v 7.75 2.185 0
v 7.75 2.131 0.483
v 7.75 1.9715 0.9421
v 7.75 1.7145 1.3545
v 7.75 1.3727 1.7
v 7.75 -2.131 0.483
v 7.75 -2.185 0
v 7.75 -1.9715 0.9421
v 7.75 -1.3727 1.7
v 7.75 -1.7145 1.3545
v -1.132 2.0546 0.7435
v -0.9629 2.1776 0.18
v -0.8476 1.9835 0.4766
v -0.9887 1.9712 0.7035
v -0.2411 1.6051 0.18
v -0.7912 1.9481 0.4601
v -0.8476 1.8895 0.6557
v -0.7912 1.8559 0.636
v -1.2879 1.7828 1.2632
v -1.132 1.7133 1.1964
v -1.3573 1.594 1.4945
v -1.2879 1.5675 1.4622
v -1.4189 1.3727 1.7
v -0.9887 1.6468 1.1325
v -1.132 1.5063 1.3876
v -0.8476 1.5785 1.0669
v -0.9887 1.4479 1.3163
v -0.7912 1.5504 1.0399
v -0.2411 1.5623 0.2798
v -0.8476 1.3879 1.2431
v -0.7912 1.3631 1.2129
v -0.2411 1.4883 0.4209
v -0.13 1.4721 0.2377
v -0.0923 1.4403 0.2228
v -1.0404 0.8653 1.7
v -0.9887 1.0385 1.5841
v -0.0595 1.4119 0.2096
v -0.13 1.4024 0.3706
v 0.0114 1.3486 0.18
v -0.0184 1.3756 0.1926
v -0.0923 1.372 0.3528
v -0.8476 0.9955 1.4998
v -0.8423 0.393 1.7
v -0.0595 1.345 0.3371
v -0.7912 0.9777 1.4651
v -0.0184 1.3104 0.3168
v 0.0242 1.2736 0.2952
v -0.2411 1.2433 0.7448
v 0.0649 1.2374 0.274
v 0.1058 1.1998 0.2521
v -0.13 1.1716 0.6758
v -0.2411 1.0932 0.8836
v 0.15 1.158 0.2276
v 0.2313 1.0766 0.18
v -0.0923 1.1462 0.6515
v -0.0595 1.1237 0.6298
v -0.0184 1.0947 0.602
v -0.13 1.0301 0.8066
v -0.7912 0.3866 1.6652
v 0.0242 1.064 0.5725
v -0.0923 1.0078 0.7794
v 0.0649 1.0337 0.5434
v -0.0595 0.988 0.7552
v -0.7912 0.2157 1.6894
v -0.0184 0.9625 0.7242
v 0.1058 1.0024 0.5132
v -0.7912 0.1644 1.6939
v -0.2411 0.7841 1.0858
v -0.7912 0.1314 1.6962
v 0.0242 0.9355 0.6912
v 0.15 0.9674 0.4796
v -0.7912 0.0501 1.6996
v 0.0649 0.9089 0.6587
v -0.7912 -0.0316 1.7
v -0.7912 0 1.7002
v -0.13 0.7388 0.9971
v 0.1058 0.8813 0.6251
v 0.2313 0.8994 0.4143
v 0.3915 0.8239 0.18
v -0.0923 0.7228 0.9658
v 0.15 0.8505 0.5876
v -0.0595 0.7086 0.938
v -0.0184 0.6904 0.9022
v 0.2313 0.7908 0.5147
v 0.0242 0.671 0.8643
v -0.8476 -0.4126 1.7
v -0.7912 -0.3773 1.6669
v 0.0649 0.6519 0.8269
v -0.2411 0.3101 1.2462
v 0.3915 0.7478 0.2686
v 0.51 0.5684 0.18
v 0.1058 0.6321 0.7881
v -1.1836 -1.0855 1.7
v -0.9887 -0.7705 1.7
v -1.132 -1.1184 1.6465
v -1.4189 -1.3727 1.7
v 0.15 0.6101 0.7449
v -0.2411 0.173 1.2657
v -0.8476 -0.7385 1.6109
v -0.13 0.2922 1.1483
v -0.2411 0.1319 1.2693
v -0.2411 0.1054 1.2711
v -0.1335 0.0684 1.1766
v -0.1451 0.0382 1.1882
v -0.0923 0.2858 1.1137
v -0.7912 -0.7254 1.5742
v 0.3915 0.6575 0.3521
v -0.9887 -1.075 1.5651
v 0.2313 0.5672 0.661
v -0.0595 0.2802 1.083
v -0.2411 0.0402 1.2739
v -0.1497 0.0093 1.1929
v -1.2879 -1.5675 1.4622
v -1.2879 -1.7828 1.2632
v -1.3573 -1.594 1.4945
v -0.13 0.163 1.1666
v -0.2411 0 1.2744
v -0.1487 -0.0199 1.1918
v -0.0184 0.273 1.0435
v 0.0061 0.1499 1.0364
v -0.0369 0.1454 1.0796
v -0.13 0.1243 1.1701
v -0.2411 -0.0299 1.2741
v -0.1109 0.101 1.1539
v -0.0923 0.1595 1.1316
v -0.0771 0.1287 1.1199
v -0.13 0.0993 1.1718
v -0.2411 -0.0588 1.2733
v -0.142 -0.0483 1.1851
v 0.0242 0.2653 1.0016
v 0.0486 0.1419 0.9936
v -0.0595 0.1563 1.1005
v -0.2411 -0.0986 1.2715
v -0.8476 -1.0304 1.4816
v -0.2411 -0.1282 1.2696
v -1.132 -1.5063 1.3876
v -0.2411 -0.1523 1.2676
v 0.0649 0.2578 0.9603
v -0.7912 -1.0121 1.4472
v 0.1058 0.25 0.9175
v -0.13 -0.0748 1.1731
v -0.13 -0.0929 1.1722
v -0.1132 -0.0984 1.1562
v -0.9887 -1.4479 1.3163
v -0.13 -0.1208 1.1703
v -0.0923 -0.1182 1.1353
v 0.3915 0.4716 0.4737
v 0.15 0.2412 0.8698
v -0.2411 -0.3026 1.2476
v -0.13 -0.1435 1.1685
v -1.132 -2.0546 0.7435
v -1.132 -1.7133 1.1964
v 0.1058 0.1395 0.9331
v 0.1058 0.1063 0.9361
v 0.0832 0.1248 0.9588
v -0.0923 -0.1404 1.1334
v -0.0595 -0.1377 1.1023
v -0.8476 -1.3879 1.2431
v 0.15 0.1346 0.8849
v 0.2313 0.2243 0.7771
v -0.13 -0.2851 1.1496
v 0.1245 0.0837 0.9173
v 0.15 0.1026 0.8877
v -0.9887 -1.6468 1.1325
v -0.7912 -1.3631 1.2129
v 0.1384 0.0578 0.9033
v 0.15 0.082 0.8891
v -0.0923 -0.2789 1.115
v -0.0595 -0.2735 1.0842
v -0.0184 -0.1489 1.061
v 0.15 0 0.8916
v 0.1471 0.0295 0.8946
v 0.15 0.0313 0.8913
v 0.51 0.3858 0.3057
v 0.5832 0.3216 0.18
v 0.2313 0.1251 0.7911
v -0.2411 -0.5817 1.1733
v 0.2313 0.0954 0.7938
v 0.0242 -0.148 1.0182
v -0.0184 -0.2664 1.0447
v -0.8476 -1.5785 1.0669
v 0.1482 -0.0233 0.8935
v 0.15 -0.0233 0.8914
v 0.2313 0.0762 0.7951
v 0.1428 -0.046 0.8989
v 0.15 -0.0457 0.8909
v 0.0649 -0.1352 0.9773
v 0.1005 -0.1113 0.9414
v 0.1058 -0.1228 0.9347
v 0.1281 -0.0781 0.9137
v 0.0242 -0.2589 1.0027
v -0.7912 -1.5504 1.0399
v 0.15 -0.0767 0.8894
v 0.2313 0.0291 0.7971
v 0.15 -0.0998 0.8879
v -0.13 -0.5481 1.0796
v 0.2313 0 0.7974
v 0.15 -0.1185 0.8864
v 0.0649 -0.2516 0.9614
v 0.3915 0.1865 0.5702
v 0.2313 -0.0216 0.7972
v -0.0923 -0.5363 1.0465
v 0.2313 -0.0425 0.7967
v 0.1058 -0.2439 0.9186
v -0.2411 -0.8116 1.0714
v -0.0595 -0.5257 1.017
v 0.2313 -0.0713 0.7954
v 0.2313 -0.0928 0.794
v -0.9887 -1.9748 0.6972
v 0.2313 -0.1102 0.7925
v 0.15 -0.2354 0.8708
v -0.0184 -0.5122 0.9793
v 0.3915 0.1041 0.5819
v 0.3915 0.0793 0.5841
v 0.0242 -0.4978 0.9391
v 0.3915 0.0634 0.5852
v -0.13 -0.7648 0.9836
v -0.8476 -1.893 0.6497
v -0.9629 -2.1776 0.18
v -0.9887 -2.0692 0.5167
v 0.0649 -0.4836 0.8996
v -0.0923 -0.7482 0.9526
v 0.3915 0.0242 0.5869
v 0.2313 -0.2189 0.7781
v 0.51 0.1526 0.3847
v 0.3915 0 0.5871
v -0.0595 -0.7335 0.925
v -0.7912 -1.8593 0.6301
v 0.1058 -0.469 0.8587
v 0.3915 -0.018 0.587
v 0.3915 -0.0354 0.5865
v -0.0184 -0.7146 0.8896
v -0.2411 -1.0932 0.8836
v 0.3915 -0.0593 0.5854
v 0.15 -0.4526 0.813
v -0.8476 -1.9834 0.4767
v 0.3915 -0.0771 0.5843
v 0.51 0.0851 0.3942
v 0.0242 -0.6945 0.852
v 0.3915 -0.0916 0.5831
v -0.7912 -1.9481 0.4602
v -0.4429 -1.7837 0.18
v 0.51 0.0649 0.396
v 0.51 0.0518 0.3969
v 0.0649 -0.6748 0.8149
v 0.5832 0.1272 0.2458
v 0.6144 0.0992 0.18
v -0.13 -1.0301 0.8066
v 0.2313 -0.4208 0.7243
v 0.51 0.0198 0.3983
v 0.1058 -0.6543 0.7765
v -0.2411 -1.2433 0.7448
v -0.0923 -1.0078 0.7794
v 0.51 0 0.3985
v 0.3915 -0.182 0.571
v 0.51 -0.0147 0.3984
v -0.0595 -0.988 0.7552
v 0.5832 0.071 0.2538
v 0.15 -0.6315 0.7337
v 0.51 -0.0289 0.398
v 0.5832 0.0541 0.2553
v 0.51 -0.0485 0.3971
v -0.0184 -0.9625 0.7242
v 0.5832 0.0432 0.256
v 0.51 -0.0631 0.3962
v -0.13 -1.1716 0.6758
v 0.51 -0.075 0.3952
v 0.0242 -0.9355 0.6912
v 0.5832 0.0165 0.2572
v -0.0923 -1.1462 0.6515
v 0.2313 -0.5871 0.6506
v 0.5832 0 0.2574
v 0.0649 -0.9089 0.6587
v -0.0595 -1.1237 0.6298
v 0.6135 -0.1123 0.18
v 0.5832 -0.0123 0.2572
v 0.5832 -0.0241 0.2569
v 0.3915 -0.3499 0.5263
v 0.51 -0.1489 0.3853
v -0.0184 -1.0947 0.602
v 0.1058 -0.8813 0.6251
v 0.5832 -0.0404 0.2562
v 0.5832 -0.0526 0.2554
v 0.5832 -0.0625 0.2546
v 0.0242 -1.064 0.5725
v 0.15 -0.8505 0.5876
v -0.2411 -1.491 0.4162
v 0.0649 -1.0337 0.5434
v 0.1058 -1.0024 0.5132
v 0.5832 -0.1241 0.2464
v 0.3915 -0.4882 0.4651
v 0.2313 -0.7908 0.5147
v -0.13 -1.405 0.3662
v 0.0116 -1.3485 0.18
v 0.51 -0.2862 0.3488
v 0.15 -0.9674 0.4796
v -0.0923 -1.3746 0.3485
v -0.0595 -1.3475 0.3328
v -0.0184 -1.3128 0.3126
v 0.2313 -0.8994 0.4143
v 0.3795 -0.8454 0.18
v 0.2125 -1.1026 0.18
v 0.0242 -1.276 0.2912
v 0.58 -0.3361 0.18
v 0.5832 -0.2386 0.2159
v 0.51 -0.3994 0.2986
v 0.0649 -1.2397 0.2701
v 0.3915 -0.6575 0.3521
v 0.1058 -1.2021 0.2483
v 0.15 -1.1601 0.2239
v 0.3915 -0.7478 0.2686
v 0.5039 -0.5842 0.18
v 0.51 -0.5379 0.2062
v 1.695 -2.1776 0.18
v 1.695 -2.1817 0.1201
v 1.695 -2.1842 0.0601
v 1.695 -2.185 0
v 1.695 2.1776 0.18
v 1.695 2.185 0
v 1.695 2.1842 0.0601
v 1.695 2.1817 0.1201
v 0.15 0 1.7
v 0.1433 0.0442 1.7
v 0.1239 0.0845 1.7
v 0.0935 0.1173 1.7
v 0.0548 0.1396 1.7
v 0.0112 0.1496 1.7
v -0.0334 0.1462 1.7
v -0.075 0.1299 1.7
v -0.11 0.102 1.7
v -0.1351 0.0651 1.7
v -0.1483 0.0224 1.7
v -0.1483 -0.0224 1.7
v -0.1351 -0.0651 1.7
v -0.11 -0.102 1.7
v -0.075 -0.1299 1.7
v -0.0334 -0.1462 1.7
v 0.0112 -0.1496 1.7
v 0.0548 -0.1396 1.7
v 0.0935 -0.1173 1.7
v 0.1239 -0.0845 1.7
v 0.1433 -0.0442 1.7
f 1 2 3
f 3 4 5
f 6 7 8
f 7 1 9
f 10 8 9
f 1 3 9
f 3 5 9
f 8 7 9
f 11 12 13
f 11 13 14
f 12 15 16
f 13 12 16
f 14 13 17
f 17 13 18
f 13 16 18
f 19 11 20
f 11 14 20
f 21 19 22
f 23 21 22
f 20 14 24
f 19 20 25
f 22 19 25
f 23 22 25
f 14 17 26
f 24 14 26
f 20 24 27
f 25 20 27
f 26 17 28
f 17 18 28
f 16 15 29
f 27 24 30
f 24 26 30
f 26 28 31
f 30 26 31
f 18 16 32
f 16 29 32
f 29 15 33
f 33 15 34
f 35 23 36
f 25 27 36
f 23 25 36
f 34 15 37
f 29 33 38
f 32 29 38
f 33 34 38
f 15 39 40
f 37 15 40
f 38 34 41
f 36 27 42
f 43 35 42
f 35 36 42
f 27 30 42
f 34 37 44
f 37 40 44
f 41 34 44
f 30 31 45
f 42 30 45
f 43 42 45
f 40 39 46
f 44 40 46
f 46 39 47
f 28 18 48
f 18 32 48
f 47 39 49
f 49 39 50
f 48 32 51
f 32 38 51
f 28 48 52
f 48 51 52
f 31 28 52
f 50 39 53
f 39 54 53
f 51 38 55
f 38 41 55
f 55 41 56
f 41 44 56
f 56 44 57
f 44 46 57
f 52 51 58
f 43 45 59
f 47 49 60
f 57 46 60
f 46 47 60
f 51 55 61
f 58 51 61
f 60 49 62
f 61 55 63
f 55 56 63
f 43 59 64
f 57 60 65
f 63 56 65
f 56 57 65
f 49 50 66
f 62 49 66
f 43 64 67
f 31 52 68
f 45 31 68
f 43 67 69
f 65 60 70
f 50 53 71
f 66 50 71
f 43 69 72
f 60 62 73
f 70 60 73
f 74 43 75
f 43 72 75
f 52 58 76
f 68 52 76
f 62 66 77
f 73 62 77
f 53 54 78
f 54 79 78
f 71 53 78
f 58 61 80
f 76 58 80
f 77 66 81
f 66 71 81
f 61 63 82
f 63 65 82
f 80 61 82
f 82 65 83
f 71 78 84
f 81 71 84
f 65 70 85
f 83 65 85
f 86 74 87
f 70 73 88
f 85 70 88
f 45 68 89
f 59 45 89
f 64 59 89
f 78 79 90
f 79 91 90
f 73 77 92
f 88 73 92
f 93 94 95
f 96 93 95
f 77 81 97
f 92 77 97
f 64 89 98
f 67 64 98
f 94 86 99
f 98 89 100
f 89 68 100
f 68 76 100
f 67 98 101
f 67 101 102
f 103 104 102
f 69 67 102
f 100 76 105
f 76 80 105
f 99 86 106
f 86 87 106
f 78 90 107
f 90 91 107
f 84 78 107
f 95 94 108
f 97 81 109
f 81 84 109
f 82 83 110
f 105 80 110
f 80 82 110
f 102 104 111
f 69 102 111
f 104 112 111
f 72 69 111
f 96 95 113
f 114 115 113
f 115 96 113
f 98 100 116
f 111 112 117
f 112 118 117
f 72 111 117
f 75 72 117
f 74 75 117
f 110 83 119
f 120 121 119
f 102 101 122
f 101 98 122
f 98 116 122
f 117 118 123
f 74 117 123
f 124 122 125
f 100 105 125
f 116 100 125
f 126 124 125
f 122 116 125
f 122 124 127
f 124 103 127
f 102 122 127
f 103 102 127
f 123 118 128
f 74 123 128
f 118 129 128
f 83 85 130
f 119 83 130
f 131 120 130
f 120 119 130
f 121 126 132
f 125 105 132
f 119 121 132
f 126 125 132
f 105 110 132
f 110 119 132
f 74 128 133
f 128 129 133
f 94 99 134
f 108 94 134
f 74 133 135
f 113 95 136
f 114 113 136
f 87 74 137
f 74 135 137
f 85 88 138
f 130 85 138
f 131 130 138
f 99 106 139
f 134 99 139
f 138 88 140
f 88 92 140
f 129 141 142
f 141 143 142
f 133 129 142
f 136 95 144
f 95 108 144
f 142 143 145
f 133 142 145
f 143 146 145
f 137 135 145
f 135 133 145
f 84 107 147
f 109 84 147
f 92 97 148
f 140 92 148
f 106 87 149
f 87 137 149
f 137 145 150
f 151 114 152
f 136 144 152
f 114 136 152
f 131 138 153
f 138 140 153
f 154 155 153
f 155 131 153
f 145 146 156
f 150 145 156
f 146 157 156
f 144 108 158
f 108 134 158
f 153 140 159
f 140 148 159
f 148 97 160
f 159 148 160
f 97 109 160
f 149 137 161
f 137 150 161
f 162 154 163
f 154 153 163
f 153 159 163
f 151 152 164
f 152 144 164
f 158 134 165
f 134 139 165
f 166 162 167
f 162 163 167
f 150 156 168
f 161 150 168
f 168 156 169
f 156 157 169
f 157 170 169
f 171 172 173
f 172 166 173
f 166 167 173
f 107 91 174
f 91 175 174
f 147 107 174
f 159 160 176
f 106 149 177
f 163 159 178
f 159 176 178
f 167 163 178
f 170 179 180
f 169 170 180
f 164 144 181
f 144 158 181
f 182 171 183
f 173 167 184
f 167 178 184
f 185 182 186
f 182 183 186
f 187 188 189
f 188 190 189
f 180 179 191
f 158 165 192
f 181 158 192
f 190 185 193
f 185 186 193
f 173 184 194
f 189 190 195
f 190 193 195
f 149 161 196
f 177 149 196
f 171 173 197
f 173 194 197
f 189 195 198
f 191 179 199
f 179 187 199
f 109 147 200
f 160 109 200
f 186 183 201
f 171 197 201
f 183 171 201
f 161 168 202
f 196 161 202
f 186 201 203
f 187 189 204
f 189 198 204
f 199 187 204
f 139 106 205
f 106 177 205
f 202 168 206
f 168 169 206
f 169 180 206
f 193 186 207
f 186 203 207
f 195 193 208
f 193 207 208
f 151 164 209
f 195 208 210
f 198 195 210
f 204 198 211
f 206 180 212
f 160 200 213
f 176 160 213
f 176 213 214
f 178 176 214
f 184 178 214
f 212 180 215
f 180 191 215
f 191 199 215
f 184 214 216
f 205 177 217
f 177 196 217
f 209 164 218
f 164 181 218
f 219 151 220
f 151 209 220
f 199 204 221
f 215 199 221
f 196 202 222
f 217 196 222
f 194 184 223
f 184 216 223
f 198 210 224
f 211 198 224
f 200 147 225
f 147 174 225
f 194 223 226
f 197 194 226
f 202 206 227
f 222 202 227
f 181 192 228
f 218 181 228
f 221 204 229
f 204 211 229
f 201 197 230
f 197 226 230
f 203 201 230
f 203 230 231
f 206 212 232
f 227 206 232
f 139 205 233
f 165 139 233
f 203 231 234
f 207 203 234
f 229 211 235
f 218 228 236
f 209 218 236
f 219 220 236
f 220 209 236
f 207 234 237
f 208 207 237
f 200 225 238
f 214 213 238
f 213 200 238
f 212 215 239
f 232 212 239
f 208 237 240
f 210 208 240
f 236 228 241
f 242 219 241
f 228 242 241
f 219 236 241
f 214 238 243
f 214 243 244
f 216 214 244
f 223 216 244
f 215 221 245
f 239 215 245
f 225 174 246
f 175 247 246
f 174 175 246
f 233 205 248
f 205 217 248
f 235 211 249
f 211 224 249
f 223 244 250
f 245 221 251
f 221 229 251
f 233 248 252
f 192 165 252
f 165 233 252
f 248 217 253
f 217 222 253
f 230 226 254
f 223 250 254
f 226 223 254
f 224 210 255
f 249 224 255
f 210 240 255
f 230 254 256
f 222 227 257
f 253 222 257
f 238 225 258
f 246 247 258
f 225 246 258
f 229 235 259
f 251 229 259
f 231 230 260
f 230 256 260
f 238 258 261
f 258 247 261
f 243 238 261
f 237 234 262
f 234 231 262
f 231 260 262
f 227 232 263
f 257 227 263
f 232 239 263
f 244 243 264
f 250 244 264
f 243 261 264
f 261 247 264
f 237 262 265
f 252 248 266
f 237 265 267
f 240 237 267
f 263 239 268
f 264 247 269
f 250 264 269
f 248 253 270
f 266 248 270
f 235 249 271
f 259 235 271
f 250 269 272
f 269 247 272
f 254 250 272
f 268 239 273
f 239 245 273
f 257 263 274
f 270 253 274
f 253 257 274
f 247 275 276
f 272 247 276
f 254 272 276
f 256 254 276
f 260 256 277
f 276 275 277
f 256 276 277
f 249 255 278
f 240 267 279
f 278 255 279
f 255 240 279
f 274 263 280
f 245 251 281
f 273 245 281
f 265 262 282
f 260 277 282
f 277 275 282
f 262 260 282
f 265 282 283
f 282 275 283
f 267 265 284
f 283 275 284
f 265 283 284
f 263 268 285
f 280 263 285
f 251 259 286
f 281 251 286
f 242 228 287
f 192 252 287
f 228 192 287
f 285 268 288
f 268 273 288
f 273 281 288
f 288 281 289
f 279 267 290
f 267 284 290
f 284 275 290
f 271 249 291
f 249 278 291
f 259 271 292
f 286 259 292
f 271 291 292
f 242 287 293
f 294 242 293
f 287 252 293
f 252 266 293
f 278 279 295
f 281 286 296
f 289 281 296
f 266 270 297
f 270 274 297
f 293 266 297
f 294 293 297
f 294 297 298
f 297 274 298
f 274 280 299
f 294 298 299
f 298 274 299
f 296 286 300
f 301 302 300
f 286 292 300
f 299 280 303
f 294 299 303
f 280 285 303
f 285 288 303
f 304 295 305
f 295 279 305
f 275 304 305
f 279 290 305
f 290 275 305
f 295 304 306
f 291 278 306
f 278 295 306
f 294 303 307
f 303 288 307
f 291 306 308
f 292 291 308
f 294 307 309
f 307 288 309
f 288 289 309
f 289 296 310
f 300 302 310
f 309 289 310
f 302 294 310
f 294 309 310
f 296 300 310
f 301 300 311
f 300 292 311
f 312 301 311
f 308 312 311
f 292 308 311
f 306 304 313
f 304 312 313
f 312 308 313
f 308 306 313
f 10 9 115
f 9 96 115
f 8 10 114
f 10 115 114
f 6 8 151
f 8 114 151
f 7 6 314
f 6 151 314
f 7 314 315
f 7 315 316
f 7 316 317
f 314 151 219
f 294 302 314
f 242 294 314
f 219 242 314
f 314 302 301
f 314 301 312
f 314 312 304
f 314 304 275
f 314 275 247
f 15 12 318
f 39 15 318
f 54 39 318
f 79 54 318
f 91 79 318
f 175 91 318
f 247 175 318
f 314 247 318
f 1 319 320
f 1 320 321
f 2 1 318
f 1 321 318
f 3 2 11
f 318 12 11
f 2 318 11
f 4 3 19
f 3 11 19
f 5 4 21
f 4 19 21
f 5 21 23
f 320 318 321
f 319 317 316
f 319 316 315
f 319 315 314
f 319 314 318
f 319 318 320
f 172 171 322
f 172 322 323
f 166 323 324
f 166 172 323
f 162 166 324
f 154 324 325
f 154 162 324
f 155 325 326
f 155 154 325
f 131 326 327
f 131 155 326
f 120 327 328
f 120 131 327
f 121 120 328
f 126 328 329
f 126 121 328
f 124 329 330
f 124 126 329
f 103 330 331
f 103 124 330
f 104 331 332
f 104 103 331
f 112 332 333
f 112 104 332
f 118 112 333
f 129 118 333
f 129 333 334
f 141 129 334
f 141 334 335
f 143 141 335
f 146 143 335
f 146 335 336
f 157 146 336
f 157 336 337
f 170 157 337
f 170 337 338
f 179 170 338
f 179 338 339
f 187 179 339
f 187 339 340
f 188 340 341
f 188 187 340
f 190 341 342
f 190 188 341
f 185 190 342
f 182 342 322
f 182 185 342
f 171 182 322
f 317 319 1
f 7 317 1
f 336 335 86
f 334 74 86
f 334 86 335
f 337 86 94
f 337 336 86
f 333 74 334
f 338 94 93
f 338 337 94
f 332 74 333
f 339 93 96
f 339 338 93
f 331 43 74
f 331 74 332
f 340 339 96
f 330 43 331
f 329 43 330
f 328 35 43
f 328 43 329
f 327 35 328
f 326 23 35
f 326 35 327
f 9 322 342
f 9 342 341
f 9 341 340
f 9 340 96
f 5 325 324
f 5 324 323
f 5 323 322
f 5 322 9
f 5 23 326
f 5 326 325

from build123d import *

# Parameters (mm, degrees)
CYLINDER001_R     = 2.185
CYLINDER001_DEPTH = 9.314408
BOX_W             = 9.314408
BOX_H             = 4.37
BOX_DEPTH         = 0.935
BOX001_W          = 3.259408
BOX001_H          = 4.37
BOX001_DEPTH      = 0.63
BOX002_W          = 9.314408
BOX002_H          = 4.37
BOX002_DEPTH      = 0.55
CYLINDER_R        = 0.15
CYLINDER_DEPTH    = 2.185
REVOLUTION_ANGLE  = 180


with BuildPart() as volumelimit:
    # Cylinder001 → Cylinder001 (new body)
    with BuildSketch(Plane(origin=(-1.564408, 0, 0), x_dir=(0, 0, -1), z_dir=(1, 0, 0))):
        Circle(CYLINDER001_R)
    extrude(amount=CYLINDER001_DEPTH)


with BuildPart() as upperedgecuttingtool:
    # Box → Box (new body)
    with BuildSketch(Plane(origin=(-1.564408, -2.185, 1.7), x_dir=(1, 0, 0), z_dir=(0, 0, 1))):
        with Locations((4.657204, 2.185)):
            Rectangle(BOX_W, BOX_H)
    extrude(amount=BOX_DEPTH)


with BuildPart() as lowerstepcuttingtool:
    # Box001 → Box001 (new body)
    with BuildSketch(Plane(origin=(-1.564408, -2.185, -0.45), x_dir=(1, 0, 0), z_dir=(0, 0, 1))):
        with Locations((1.629704, 2.185)):
            Rectangle(BOX001_W, BOX001_H)
    extrude(amount=BOX001_DEPTH)


with BuildPart() as zposcorrectioncuttingtool:
    # Box002 → Box002 (new body)
    with BuildSketch(Plane(origin=(-1.564408, -2.185, -0.55), x_dir=(1, 0, 0), z_dir=(0, 0, 1))):
        with Locations((4.657204, 2.185)):
            Rectangle(BOX002_W, BOX002_H)
    extrude(amount=BOX002_DEPTH)


with BuildPart() as cuttingtools:
    # Cylinder → Cylinder (new body)
    with BuildSketch(Plane.XY):
        Circle(CYLINDER_R)
    extrude(amount=CYLINDER_DEPTH)

    # Fusion: union UpperEdgeCuttingTool, LowerStepCuttingTool, ZPosCorrectionCuttingTool
    add(upperedgecuttingtool.part)
    add(lowerstepcuttingtool.part)
    add(zposcorrectioncuttingtool.part)


with BuildPart() as mirrorwithoutmount:
    # Sketch → Revolution (revolve)
    with BuildSketch(Plane.XY):
        with BuildLine():
            Line((0.75, 0), (7.75, 0))
            Line((7.75, 0), (7.75, 2.635))
            Line((7.75, 2.635), (-1.564408, 2.635))
            add(Edge.make_bspline(
                [(-1.564408, 2.635), (0.75, 1.3175), (0.75, 0)],
                knots=[-2.635, -2.635, -2.635, 0, 0, 0], degree=2))
        make_face()
    revolve(axis=Axis((0, 0, 0), (1, 0, 0)), revolution_arc=REVOLUTION_ANGLE)


with BuildPart() as mirrorwithoutmount_1:
    # Body001 placement: moved
    add(mirrorwithoutmount.part.moved(Location((0, 0, -0.45))))

    # Cut: cut CuttingTools
    add(cuttingtools.part, mode=Mode.SUBTRACT)

    # Common: intersect VolumeLimit
    add(volumelimit.part, mode=Mode.INTERSECT)


solid = mirrorwithoutmount_1.part
